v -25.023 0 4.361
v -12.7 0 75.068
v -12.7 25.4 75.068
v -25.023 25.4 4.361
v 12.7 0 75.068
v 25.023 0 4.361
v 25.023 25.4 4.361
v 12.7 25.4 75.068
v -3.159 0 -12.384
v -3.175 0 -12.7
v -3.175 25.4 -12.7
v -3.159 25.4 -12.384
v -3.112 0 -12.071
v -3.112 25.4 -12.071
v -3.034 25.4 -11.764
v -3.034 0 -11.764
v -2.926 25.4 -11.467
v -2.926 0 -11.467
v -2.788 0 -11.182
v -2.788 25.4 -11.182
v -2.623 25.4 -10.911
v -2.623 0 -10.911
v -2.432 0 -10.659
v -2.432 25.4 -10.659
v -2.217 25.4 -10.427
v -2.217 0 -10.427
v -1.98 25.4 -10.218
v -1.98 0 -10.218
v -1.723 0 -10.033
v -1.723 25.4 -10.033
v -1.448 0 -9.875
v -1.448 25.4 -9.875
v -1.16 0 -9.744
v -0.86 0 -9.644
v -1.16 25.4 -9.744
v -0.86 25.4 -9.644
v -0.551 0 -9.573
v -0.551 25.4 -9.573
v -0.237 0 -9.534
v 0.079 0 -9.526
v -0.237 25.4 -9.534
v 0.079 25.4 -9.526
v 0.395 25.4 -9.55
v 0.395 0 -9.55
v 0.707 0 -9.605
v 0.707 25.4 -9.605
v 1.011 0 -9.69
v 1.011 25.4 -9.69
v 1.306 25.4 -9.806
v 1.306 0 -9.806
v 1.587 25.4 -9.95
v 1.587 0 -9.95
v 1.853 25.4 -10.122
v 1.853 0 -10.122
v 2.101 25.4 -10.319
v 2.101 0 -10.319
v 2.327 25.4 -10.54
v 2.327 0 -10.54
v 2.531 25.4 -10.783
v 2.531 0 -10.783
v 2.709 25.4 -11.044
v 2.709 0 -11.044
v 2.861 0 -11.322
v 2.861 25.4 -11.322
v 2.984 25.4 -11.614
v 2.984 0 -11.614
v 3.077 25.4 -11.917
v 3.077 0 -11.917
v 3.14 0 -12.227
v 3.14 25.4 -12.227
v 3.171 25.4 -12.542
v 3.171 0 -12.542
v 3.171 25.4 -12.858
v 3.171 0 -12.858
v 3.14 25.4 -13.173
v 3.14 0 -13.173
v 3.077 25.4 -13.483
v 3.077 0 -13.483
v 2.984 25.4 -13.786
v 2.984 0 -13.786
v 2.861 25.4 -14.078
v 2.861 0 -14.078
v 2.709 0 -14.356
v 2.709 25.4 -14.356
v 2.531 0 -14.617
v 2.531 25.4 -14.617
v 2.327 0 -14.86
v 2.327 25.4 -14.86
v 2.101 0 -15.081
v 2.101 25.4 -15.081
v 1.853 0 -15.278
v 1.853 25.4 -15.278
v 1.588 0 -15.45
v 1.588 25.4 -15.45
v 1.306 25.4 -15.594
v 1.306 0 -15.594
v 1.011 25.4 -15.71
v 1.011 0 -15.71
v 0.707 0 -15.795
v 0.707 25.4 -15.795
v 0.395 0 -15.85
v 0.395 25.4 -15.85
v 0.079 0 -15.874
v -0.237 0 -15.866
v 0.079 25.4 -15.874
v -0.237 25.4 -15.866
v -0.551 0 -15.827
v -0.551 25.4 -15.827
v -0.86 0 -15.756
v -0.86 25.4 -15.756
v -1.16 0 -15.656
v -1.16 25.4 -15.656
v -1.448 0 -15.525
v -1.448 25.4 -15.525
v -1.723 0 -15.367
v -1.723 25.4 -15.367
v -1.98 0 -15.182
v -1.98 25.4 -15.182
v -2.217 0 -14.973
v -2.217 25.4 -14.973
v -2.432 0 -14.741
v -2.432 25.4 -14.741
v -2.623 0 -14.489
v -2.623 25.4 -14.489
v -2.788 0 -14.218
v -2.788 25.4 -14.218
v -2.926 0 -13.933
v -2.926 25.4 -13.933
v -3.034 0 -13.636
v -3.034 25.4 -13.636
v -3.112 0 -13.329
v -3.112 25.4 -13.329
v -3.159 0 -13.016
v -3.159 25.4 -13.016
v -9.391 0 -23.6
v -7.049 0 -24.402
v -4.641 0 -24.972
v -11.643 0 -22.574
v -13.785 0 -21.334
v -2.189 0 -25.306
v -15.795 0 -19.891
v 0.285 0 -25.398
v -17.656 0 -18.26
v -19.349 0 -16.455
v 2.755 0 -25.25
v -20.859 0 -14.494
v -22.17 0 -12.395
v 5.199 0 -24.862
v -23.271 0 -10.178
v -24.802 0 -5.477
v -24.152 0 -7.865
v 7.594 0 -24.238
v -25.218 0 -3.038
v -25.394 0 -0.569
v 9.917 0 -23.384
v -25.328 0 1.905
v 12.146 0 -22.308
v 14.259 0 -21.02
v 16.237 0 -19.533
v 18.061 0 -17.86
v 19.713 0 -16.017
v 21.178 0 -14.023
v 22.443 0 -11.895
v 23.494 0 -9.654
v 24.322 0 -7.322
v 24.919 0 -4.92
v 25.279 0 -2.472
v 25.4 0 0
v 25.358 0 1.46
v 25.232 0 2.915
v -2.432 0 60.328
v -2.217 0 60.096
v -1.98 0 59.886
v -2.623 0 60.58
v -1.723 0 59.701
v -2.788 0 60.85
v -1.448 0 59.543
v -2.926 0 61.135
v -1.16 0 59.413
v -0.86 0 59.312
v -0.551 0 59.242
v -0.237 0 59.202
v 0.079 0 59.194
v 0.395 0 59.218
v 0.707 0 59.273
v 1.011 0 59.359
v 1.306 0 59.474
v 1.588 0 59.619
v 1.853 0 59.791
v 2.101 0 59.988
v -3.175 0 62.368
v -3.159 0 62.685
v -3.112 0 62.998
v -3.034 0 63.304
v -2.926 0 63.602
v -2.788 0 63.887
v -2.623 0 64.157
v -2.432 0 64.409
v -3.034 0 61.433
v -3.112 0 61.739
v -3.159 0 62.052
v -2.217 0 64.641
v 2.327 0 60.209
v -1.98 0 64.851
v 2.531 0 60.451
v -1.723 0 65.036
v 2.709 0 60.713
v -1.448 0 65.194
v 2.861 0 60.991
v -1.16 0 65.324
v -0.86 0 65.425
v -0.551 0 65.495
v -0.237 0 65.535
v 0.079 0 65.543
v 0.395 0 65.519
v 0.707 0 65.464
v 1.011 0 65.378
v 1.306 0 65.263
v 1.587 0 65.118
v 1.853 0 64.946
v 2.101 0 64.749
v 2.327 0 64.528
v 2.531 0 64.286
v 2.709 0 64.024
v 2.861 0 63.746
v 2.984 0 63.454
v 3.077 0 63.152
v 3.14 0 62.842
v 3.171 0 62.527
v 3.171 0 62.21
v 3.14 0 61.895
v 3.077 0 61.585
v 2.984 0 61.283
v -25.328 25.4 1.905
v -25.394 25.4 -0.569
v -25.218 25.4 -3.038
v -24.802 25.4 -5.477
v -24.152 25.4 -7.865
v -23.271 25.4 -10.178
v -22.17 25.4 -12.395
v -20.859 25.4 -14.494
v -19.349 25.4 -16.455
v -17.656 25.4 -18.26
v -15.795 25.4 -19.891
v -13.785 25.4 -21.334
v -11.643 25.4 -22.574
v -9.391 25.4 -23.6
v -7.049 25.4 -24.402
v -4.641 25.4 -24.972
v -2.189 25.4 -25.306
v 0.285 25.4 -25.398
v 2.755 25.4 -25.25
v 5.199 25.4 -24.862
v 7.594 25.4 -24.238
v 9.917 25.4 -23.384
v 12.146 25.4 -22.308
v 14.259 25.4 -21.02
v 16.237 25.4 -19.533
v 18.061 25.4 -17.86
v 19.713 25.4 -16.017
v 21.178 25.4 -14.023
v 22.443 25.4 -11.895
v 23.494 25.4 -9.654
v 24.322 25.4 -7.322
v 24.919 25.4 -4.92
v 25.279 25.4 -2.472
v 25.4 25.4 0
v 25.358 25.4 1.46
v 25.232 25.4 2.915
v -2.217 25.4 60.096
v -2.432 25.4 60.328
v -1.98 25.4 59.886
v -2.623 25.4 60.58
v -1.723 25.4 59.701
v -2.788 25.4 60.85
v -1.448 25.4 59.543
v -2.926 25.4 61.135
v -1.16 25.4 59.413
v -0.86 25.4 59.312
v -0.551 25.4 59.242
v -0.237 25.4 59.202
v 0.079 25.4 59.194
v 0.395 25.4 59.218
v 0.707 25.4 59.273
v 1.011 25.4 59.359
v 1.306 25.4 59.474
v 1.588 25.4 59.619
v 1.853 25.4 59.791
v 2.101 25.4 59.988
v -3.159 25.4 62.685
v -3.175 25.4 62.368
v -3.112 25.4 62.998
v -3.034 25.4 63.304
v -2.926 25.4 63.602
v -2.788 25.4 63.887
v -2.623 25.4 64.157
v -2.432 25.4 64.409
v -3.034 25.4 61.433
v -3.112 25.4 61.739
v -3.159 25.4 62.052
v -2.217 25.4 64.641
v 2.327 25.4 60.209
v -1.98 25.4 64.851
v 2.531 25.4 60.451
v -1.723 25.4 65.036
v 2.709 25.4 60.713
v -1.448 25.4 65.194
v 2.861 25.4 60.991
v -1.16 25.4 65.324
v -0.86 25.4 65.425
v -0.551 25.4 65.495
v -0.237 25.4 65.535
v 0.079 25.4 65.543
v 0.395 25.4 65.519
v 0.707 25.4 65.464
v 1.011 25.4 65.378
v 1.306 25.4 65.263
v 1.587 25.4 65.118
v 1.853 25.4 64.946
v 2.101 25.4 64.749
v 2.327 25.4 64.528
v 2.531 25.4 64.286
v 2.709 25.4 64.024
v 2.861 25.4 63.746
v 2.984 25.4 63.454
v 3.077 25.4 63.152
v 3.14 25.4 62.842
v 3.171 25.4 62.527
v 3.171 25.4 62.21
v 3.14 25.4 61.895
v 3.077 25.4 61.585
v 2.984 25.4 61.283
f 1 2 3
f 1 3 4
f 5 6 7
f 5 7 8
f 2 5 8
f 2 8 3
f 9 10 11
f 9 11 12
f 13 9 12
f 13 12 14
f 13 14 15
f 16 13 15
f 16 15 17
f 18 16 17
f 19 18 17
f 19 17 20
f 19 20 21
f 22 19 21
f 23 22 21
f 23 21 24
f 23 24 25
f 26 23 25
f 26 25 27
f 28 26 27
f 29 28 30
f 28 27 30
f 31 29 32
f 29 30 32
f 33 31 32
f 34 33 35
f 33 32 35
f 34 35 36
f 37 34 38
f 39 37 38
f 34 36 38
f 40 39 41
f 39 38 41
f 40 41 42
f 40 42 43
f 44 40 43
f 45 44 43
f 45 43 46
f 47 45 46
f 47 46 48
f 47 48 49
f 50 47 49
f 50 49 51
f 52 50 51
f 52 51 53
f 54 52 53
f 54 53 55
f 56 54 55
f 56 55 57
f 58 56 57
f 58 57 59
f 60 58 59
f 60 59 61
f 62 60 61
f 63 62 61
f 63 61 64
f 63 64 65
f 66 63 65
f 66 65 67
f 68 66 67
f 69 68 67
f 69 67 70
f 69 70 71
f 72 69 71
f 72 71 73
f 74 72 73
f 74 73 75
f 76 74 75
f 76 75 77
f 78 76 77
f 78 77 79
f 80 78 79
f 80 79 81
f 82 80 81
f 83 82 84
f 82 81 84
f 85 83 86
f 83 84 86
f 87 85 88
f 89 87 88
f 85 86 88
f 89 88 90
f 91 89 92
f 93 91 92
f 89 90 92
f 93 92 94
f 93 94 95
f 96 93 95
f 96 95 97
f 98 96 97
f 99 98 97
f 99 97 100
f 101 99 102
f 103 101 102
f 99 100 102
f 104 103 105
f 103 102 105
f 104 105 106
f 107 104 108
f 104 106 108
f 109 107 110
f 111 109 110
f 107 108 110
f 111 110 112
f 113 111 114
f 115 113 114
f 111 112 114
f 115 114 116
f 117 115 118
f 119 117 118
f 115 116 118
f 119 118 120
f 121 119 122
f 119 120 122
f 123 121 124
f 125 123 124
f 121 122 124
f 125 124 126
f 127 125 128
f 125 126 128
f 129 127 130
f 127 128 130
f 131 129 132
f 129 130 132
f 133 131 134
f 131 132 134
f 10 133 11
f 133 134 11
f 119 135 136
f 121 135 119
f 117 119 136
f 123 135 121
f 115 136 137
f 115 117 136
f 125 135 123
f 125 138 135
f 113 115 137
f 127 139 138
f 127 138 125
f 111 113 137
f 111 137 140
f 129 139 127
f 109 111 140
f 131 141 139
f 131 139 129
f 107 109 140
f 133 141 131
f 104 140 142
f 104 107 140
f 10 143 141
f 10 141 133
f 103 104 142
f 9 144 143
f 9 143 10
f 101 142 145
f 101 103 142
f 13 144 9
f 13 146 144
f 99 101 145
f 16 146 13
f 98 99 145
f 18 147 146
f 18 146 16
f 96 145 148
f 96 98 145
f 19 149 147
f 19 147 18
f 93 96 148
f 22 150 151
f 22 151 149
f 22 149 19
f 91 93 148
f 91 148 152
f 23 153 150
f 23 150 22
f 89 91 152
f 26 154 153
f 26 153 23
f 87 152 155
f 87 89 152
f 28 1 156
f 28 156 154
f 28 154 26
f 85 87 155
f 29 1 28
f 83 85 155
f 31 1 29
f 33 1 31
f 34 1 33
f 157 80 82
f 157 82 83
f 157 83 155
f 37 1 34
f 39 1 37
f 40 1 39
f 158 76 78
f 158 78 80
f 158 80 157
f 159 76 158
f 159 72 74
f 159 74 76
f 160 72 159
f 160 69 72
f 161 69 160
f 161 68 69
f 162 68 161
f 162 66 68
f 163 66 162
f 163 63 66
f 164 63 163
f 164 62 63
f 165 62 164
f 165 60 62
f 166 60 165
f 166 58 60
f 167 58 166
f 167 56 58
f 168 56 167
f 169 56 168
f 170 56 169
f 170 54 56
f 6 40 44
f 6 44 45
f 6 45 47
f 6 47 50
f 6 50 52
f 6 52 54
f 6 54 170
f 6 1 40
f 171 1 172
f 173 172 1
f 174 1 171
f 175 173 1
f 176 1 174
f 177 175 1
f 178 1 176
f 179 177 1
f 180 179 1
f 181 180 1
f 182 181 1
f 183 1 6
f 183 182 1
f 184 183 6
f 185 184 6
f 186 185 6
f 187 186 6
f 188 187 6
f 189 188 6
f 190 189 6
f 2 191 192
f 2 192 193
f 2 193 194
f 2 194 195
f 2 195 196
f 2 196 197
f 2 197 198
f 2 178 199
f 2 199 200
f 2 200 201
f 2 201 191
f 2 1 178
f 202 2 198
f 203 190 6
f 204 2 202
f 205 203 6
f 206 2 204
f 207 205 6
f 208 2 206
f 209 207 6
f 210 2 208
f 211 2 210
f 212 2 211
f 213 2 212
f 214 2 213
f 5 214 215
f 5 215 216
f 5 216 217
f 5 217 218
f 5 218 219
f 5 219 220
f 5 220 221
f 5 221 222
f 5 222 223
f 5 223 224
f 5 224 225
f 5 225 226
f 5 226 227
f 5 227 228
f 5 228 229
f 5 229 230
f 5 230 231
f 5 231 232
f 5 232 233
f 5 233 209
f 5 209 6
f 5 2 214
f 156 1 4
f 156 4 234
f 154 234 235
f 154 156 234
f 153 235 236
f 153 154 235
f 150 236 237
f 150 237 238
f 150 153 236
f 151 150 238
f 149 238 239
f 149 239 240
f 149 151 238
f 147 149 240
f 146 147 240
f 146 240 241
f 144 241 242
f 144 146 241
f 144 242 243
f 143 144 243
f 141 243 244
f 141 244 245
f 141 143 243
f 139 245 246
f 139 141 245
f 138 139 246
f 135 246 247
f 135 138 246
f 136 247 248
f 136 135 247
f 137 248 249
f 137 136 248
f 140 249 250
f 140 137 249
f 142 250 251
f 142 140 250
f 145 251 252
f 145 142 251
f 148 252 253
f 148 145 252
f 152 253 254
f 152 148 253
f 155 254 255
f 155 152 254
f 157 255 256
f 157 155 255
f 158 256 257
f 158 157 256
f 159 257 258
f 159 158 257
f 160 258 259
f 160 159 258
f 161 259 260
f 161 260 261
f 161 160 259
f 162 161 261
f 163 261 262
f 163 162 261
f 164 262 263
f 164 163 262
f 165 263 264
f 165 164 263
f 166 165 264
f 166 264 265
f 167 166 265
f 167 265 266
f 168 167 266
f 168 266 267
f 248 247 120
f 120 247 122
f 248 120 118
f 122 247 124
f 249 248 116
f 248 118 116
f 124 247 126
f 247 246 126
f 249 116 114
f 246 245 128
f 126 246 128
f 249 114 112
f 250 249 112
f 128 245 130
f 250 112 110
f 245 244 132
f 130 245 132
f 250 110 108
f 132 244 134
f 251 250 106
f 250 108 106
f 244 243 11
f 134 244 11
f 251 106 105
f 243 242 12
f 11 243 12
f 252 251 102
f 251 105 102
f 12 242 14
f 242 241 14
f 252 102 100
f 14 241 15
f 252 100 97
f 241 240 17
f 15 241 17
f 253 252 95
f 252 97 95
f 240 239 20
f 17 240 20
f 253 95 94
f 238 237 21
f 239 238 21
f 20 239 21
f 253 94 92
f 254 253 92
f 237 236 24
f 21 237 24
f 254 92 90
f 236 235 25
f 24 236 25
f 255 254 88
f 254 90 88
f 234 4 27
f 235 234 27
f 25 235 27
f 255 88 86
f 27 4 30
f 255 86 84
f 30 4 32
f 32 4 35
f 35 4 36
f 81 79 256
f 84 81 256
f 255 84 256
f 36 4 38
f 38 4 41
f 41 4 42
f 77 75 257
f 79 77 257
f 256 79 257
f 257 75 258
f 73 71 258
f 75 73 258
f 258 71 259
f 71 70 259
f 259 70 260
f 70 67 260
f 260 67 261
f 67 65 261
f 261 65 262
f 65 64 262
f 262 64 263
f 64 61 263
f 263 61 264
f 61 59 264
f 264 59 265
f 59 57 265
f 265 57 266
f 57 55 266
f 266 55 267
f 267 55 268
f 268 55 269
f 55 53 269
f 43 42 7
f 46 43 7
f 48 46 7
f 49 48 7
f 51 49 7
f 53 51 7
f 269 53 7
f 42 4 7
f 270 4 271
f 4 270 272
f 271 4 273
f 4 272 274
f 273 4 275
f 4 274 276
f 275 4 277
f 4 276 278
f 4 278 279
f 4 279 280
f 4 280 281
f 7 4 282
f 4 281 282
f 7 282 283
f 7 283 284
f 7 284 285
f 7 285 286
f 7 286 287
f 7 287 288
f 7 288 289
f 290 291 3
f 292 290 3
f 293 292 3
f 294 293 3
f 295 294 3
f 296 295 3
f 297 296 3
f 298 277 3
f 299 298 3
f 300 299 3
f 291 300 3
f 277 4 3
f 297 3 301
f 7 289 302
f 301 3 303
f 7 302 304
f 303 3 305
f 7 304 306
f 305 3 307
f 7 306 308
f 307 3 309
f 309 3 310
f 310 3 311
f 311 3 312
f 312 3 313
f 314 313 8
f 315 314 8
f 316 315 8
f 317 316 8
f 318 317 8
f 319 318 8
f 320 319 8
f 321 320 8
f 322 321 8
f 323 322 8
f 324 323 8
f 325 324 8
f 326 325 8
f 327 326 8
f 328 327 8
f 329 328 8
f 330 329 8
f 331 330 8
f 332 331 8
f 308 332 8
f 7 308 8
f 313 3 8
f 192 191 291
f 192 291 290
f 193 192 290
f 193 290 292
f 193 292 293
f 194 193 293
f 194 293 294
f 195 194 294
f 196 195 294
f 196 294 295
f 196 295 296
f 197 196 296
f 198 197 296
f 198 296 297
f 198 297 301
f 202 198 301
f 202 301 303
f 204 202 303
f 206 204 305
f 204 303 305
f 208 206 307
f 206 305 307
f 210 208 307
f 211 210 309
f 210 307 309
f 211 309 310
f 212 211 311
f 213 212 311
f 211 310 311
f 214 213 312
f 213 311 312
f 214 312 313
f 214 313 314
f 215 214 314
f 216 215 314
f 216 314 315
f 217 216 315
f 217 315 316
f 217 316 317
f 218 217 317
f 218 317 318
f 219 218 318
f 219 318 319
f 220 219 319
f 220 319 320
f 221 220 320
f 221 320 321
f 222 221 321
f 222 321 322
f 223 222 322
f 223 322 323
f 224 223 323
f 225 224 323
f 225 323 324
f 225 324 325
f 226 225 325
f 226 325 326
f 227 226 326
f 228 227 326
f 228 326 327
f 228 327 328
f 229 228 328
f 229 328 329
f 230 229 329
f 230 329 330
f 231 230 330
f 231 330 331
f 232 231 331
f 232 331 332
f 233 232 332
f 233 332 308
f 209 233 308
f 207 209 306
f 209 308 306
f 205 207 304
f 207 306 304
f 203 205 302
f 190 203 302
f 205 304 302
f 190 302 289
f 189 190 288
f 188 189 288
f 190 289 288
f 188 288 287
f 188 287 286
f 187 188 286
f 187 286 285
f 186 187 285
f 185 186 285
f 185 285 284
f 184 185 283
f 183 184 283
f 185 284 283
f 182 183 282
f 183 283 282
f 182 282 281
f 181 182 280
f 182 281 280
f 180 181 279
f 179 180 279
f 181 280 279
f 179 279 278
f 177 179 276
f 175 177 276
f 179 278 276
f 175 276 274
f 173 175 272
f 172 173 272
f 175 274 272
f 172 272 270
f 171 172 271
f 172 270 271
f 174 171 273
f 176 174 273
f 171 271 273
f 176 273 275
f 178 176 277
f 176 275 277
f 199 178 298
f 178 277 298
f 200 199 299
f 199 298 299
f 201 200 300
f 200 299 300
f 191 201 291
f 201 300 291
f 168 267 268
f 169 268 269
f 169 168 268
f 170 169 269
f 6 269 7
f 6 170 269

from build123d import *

# Parameters (mm, degrees)
F1_DEPTH = 25.4
F3_D     = 6.35


with BuildPart() as f1:
    # F0 (on Front) → F1 (new body)
    with BuildSketch(Plane.XZ):
        with BuildLine():
            Line((-12.7, 75.068495), (-25.022832, 4.360951))
            ThreePointArc((-25.022832, 4.360951), (-2.188615, -25.305532), (25.4, 0))
            ThreePointArc((25.4, 0), (25.305532, 2.188615), (25.022832, 4.360951))
            Line((25.022832, 4.360951), (12.7, 75.068495))
            Line((12.7, 75.068495), (-12.7, 75.068495))
        make_face()
    extrude(amount=-F1_DEPTH)

    # F3 (through all)
    with Locations(Plane.XZ):
        with Locations((0, -12.7), (0, 62.368495)):
            Hole(F3_D / 2)


solid = f1.part
